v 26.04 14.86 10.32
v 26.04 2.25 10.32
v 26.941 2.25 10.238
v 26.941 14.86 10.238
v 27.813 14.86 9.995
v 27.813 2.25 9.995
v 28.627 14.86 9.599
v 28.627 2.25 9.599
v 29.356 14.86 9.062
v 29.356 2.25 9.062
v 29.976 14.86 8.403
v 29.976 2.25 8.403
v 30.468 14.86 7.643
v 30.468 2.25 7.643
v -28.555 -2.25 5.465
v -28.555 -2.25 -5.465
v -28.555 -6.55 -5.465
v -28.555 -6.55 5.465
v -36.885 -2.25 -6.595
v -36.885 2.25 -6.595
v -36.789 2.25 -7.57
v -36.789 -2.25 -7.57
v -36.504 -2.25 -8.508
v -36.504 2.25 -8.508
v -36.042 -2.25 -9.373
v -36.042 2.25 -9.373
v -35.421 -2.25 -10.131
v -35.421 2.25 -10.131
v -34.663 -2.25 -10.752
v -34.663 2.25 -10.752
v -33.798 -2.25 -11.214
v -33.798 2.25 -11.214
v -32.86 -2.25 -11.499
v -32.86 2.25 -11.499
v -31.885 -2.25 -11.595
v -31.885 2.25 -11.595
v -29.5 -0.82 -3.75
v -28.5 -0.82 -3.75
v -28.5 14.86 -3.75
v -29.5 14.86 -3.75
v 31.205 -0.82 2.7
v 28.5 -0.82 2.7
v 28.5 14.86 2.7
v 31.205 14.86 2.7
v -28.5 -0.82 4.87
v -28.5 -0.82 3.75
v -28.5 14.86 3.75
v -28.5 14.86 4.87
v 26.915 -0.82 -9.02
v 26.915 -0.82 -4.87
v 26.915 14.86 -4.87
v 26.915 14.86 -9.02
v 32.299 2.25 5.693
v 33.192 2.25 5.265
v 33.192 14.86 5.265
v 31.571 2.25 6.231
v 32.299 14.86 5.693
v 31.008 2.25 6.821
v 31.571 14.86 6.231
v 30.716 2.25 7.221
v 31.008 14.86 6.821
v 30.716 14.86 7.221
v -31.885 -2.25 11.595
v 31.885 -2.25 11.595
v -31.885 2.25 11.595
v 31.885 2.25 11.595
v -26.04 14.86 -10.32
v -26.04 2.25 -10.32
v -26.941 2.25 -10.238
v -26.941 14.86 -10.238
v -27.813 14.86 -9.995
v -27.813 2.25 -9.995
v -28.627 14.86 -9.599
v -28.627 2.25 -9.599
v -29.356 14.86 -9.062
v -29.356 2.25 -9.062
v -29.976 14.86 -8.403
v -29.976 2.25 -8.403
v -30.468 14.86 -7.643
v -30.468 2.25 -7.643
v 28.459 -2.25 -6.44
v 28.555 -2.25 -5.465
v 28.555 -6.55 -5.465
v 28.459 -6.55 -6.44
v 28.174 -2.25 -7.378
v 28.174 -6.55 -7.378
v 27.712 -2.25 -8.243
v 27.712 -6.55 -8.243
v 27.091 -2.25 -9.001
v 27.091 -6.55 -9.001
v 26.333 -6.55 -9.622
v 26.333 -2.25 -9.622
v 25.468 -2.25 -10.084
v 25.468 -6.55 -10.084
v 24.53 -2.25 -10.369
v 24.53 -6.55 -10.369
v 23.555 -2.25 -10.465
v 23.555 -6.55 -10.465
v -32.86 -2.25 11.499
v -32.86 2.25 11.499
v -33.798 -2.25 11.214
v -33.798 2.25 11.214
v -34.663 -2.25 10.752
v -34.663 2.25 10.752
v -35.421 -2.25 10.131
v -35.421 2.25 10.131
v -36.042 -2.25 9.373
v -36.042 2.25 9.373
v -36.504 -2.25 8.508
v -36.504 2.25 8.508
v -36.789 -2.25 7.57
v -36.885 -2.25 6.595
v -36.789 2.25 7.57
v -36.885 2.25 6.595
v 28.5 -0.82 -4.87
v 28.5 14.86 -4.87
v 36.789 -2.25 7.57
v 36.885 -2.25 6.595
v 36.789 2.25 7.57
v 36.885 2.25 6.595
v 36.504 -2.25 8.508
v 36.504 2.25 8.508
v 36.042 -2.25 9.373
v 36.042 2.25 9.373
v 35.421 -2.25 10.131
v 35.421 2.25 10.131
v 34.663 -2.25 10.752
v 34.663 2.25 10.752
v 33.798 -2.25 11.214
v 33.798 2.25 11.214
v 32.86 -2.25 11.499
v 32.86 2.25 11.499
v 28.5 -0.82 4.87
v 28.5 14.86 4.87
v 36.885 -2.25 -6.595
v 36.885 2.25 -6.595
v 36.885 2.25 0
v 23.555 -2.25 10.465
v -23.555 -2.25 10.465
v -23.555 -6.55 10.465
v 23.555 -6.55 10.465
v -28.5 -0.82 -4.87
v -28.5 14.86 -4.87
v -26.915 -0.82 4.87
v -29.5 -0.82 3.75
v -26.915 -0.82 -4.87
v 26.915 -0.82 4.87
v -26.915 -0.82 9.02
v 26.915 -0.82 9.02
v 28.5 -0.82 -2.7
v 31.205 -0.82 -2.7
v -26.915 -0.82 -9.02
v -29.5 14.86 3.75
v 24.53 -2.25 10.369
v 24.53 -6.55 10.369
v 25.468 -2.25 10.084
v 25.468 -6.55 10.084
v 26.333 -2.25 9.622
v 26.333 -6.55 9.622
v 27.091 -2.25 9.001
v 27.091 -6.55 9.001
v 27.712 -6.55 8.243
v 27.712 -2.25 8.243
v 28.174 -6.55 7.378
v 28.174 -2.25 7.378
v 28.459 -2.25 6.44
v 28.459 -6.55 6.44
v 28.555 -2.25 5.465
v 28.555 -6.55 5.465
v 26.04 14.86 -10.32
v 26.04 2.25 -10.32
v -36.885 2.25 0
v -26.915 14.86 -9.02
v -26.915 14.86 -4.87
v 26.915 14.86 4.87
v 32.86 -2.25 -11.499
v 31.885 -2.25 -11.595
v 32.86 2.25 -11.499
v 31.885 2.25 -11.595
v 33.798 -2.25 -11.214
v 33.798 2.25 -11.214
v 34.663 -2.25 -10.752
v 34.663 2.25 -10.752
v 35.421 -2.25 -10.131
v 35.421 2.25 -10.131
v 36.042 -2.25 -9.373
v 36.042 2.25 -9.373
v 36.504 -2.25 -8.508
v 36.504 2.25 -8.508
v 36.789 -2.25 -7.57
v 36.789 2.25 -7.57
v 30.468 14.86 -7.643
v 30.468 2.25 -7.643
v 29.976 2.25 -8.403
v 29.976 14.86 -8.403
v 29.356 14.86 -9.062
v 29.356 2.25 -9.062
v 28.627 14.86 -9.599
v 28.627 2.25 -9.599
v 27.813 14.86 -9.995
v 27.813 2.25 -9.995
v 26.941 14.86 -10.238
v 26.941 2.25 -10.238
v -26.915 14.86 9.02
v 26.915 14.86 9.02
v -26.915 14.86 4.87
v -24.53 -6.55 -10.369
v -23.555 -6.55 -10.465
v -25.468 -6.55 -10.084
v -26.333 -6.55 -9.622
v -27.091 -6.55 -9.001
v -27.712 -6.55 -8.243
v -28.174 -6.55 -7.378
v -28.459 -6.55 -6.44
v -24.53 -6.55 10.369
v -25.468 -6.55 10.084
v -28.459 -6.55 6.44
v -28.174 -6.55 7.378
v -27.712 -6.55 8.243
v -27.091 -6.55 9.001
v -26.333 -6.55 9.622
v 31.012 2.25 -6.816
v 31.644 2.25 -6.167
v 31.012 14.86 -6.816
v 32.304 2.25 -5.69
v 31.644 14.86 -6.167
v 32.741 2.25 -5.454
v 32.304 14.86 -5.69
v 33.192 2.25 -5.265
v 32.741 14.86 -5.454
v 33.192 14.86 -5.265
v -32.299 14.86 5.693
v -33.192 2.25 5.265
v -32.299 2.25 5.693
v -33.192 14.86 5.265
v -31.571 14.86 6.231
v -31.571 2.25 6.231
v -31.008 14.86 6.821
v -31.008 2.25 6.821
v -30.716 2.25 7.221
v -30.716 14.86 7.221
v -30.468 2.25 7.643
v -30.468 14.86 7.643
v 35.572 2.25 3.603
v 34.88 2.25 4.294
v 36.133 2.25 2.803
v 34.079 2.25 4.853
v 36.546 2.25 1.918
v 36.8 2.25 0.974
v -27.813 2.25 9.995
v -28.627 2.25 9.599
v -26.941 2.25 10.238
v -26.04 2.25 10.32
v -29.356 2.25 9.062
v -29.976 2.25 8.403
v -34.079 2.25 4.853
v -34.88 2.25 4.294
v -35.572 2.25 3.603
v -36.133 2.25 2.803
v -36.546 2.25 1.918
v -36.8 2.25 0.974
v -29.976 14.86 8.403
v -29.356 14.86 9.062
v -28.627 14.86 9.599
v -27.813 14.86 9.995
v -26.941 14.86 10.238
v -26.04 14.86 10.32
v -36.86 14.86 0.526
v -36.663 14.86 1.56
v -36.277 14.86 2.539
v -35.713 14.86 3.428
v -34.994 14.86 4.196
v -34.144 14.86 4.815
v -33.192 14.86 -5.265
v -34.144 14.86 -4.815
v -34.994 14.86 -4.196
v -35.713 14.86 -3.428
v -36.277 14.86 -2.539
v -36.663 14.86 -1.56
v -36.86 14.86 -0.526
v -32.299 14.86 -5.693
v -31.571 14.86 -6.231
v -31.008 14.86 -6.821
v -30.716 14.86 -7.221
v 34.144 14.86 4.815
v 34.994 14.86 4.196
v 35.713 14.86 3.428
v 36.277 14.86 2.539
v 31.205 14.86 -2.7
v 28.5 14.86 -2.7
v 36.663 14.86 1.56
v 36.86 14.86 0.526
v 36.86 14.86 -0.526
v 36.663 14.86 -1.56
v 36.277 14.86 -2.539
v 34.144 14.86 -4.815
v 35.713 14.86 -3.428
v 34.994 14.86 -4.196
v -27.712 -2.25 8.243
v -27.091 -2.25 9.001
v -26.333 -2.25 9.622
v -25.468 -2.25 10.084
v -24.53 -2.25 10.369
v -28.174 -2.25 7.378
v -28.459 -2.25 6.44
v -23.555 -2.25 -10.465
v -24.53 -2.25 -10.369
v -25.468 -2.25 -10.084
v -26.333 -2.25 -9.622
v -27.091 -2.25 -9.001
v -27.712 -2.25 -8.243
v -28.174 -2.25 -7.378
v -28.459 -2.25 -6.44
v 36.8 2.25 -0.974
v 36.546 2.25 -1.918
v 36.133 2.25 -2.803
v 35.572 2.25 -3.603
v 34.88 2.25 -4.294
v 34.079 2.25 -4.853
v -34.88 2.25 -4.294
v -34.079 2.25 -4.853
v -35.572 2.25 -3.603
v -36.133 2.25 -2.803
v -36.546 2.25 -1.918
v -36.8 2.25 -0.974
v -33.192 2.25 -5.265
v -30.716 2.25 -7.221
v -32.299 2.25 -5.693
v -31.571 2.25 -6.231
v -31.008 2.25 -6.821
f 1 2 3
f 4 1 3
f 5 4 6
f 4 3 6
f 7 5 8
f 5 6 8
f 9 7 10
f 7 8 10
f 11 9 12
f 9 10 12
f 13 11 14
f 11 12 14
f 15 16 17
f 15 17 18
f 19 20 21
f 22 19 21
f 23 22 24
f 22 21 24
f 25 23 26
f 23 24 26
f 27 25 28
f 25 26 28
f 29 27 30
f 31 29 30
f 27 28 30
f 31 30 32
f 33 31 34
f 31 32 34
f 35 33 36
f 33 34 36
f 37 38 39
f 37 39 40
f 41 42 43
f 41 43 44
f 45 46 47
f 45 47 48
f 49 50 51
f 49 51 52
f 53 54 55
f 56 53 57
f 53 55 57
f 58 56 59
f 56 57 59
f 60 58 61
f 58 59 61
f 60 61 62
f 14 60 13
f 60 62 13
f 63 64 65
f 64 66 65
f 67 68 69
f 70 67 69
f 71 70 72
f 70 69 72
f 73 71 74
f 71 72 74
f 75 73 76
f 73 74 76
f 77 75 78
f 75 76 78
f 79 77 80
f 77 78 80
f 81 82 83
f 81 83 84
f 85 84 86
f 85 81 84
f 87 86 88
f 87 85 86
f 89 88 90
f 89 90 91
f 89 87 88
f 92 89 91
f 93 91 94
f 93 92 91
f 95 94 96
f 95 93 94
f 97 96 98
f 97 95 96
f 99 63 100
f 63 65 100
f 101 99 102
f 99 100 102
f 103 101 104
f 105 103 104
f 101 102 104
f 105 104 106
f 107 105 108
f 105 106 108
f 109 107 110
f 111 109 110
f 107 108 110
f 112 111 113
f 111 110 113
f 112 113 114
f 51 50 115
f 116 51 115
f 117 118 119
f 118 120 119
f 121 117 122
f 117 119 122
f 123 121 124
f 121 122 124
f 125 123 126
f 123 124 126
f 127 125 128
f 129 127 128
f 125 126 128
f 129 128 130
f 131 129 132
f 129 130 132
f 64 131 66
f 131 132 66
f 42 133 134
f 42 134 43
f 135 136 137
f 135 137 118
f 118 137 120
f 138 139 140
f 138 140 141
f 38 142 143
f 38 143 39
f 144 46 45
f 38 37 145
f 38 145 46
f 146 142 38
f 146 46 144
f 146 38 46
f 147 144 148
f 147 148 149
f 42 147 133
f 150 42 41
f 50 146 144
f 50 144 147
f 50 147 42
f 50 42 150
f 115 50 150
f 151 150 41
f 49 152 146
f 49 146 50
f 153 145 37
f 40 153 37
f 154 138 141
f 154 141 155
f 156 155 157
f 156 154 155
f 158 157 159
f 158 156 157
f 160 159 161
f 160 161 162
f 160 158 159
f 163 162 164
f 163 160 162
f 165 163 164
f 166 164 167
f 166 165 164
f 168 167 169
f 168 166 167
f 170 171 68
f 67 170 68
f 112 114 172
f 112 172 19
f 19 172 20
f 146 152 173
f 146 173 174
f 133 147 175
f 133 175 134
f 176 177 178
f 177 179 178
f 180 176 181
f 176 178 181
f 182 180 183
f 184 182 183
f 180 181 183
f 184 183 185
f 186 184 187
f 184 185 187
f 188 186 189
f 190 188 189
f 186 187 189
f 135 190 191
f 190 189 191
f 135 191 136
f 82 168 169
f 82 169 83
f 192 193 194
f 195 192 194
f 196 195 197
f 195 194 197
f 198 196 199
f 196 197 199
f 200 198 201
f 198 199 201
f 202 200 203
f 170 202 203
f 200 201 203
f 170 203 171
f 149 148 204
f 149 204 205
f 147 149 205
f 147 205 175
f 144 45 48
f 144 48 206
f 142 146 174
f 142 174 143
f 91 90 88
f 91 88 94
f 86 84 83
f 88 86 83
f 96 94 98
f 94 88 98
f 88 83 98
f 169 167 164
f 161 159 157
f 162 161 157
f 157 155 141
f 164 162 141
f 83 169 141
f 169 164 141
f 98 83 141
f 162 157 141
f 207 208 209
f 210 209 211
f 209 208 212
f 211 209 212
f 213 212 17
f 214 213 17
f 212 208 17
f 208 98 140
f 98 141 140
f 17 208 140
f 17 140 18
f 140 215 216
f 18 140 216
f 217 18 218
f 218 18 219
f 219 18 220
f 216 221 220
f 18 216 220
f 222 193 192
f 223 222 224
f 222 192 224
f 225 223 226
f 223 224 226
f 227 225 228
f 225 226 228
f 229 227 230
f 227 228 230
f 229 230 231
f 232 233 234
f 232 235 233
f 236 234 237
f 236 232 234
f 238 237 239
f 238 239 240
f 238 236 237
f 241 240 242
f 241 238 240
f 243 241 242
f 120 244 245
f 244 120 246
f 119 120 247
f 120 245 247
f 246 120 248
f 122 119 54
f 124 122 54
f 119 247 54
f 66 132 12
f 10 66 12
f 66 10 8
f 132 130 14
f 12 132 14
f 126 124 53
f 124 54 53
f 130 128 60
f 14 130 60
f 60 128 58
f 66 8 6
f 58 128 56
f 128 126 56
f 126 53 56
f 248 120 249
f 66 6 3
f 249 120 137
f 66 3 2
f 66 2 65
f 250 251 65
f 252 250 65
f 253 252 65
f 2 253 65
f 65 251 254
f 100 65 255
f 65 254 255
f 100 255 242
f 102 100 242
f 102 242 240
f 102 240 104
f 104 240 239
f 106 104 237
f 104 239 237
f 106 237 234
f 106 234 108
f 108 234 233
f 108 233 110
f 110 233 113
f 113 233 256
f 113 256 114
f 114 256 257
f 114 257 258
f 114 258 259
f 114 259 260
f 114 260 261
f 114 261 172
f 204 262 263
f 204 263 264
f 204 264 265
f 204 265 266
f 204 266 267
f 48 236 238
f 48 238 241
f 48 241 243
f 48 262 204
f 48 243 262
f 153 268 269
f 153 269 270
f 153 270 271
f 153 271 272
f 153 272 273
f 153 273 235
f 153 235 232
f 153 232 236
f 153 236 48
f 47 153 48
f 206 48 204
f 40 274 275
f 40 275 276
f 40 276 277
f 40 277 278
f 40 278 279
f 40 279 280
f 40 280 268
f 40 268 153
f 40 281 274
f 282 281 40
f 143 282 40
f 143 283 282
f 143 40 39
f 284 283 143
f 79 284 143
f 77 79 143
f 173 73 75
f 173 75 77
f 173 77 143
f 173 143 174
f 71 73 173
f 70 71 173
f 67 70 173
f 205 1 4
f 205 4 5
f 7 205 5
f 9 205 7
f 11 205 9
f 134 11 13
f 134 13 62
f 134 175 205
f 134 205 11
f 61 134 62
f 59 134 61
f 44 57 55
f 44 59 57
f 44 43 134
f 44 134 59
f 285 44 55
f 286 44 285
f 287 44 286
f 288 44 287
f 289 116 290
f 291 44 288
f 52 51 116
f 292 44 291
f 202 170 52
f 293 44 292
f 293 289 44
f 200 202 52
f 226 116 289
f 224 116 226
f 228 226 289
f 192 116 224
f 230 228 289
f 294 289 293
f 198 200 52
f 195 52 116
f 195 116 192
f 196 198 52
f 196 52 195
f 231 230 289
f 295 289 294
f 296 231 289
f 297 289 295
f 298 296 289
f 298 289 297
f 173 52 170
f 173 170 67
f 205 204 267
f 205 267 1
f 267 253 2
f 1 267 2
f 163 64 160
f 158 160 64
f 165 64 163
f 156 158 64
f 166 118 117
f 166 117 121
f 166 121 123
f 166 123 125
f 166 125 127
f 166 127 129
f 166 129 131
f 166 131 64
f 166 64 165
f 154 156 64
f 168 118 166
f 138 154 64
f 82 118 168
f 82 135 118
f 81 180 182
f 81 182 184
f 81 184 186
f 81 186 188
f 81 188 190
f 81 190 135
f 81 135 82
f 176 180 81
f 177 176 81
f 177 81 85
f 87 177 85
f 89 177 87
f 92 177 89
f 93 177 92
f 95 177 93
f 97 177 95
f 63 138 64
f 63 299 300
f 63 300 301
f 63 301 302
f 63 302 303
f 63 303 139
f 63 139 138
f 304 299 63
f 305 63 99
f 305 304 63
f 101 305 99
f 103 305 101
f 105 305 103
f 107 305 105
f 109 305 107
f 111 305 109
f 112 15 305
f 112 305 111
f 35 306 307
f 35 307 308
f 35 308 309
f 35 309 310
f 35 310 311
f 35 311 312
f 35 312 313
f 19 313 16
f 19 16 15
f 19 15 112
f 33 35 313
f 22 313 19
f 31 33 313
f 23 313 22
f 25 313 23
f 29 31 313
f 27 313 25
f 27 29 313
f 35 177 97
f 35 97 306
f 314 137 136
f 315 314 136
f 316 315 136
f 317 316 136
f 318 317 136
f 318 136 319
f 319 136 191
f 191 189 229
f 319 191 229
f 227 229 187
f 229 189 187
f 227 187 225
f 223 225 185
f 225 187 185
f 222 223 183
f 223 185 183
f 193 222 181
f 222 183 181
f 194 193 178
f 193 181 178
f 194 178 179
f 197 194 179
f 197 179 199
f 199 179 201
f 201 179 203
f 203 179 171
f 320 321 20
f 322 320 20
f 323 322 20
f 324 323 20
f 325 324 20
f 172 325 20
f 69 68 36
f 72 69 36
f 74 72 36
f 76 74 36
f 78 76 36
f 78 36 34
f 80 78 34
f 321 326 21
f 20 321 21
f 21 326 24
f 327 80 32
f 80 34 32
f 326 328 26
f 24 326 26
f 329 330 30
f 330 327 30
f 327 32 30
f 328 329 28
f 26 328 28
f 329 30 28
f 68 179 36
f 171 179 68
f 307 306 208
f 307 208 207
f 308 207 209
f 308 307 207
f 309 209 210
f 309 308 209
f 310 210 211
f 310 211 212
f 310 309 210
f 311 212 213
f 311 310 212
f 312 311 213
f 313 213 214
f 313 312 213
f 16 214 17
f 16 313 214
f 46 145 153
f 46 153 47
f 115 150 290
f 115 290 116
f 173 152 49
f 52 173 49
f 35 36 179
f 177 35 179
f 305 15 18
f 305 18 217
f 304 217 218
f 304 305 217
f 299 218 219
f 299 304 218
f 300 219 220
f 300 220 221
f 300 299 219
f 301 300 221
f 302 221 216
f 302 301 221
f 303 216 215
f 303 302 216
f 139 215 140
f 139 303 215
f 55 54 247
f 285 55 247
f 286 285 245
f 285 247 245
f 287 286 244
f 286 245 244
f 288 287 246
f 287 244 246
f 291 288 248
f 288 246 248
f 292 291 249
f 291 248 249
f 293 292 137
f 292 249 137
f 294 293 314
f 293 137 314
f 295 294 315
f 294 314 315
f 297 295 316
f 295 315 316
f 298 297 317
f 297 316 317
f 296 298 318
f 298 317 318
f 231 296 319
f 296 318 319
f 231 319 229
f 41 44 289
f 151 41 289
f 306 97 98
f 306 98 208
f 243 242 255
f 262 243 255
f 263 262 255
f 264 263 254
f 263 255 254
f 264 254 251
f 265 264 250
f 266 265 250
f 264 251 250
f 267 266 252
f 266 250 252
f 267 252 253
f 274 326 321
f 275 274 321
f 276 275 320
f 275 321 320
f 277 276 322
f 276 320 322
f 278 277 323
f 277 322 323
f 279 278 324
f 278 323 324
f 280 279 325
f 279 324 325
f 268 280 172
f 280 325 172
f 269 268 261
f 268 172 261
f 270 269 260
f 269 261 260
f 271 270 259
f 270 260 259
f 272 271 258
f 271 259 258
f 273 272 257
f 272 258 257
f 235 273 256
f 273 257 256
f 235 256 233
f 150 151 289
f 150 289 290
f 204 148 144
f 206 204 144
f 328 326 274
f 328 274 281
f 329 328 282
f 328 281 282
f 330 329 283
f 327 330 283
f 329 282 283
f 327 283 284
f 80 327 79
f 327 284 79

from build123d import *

# Parameters (mm, degrees)
EXTRUDE_1_DEPTH          = 2.25
EXTRUDE_2_DEPTH          = 12.61
FILLET_1_R               = 5
EXTRUDE_3_DEPTH          = 4.3
CUT_EXTRUDE_1_DEPTH      = 45.196553708
CUT_EXTRUDE_1_DEPTH_BACK = 15.68
SKETCH_4_W               = 53.83
SKETCH_4_H               = 4.15
SKETCH_4_W_2             = 1
SKETCH_4_H_2             = 7.5
SKETCH_4_W_3             = 1.585
SKETCH_4_H_3             = 5.4
SKETCH_4_W_4             = 2.705
SKETCH_4_W_5             = 1.12
SKETCH_4_H_4             = 2.17


with BuildPart() as part:
    # Эскиз1 → Бобышка-Вытянуть1 (new, symmetric)
    with BuildSketch(Plane(origin=(0, 0, 0), x_dir=(1, 0, 0), z_dir=(0, 1, 0))):
        with BuildLine():
            Line((-31.885, 11.595), (31.885, 11.595))
            ThreePointArc((31.885, 11.595), (35.420533906, 10.130533906), (36.885, 6.595))
            Line((36.885, 6.595), (36.885, -6.595))
            ThreePointArc((36.885, -6.595), (35.420533906, -10.130533906), (31.885, -11.595))
            Line((31.885, -11.595), (-31.885, -11.595))
            ThreePointArc((-31.885, -11.595), (-35.420533906, -10.130533906), (-36.885, -6.595))
            Line((-36.885, -6.595), (-36.885, 6.595))
            ThreePointArc((-36.885, 6.595), (-35.420533906, 10.130533906), (-31.885, 11.595))
        make_face()
    extrude(amount=EXTRUDE_1_DEPTH, both=True)

    # Эскиз2 → Бобышка-Вытянуть2 (add)
    with BuildSketch(Plane(origin=(0, 2.25, 0), x_dir=(1, 0, 0), z_dir=(0, 1, 0))):
        with BuildLine():
            ThreePointArc((-31.04, 5.32), (-31.038038076, 5.460054955), (-31.032153844, 5.6))
            Line((-31.032153844, 5.6), (-31.285, 5.6))
            ThreePointArc((-31.285, 5.6), (-36.885, 0), (-31.285, -5.6))
            Line((-31.285, -5.6), (-31.032153844, -5.6))
            ThreePointArc((-31.032153844, -5.6), (-31.038038076, -5.460054955), (-31.04, -5.32))
            Line((-31.04, -5.32), (-31.04, 5.32))
        make_face()
        with BuildLine():
            Line((31.032153844, -5.6), (-31.032153844, -5.6))
            ThreePointArc((-31.032153844, -5.6), (-29.475112807, -8.953180425), (-26.04, -10.32))
            Line((-26.04, -10.32), (26.04, -10.32))
            ThreePointArc((26.04, -10.32), (29.475112807, -8.953180425), (31.032153844, -5.6))
        make_face()
        with BuildLine():
            Line((31.032153844, 5.6), (-31.032153844, 5.6))
            ThreePointArc((-31.032153844, 5.6), (-31.038038076, 5.460054955), (-31.04, 5.32))
            Line((-31.04, 5.32), (-31.04, -5.32))
            ThreePointArc((-31.04, -5.32), (-31.038038076, -5.460054955), (-31.032153844, -5.6))
            Line((-31.032153844, -5.6), (31.032153844, -5.6))
            ThreePointArc((31.032153844, -5.6), (31.038038076, -5.460054955), (31.04, -5.32))
            Line((31.04, -5.32), (31.04, 5.32))
            ThreePointArc((31.04, 5.32), (31.038038076, 5.460054955), (31.032153844, 5.6))
        make_face()
        with BuildLine():
            Line((26.04, 10.32), (-26.04, 10.32))
            ThreePointArc((-26.04, 10.32), (-29.475112807, 8.953180425), (-31.032153844, 5.6))
            Line((-31.032153844, 5.6), (31.032153844, 5.6))
            ThreePointArc((31.032153844, 5.6), (29.475112807, 8.953180425), (26.04, 10.32))
        make_face()
        with BuildLine():
            Line((31.285, 5.6), (31.032153844, 5.6))
            ThreePointArc((31.032153844, 5.6), (31.038038076, 5.460054955), (31.04, 5.32))
            Line((31.04, 5.32), (31.04, -5.32))
            ThreePointArc((31.04, -5.32), (31.038038076, -5.460054955), (31.032153844, -5.6))
            Line((31.032153844, -5.6), (31.285, -5.6))
            ThreePointArc((31.285, -5.6), (36.885, 0), (31.285, 5.6))
        make_face()
    extrude(amount=EXTRUDE_2_DEPTH)

    # Скругление1
    fillet_1_edges = [part.edges().sort_by_distance(p)[0] for p in [
        (-31.032153844, 8.555, 5.6),
        (-31.032153844, 8.555, -5.6),
        (31.032153844, 8.555, -5.6),
        (31.032153844, 8.555, 5.6),
    ]]
    fillet(fillet_1_edges, radius=FILLET_1_R)

    # Эскиз3 → Бобышка-Вытянуть3 (add)
    with BuildSketch(Plane.XZ.offset(2.25)):
        with BuildLine():
            Line((-23.555, 10.465), (23.555, 10.465))
            ThreePointArc((23.555, 10.465), (27.090533906, 9.000533906), (28.555, 5.465))
            Line((28.555, 5.465), (28.555, -5.465))
            ThreePointArc((28.555, -5.465), (27.090533906, -9.000533906), (23.555, -10.465))
            Line((23.555, -10.465), (-23.555, -10.465))
            ThreePointArc((-23.555, -10.465), (-27.090533906, -9.000533906), (-28.555, -5.465))
            Line((-28.555, -5.465), (-28.555, 5.465))
            ThreePointArc((-28.555, 5.465), (-27.090533906, 9.000533906), (-23.555, 10.465))
        make_face()
    extrude(amount=EXTRUDE_3_DEPTH)

    # Эскиз4 → Вырез-Вытянуть1 (cut, two sides: drawn at the far end of the back side and taken through both)
    with BuildSketch(Plane(origin=(0, 14.86, 0), x_dir=(1, 0, 0), z_dir=(0, 1, 0)).offset(-CUT_EXTRUDE_1_DEPTH_BACK)):
        Polygon((26.915, 4.87), (-26.915, 4.87), (-26.915, -4.87), (26.915, -4.87), (26.915, -2.7), (25.795, -2.7), (25.795, 2.7), (26.915, 2.7), align=None)
        with Locations((0, 6.945)):
            Rectangle(SKETCH_4_W, SKETCH_4_H)
        with Locations((-29, 0)):
            Rectangle(SKETCH_4_W_2, SKETCH_4_H_2)
        with Locations((-28, 0)):
            Rectangle(SKETCH_4_W_2, SKETCH_4_H_2)
        Polygon((-26.915, -4.87), (-26.915, 4.87), (-28.5, 4.87), (-28.5, 3.75), (-27.5, 3.75), (-27.5, -3.75), (-28.5, -3.75), (-28.5, -4.87), align=None)
        with Locations((0, -6.945)):
            Rectangle(SKETCH_4_W, SKETCH_4_H)
        with Locations((27.7075, 0)):
            Rectangle(SKETCH_4_W_3, SKETCH_4_H_3)
        with Locations((29.8525, 0)):
            Rectangle(SKETCH_4_W_4, SKETCH_4_H_3)
        with Locations((26.355, 0)):
            Rectangle(SKETCH_4_W_5, SKETCH_4_H_3)
        with Locations((27.7075, -3.785)):
            Rectangle(SKETCH_4_W_3, SKETCH_4_H_4)
        with Locations((27.7075, 3.785)):
            Rectangle(SKETCH_4_W_3, SKETCH_4_H_4)
    extrude(amount=CUT_EXTRUDE_1_DEPTH + CUT_EXTRUDE_1_DEPTH_BACK, mode=Mode.SUBTRACT)


solid = part.part
